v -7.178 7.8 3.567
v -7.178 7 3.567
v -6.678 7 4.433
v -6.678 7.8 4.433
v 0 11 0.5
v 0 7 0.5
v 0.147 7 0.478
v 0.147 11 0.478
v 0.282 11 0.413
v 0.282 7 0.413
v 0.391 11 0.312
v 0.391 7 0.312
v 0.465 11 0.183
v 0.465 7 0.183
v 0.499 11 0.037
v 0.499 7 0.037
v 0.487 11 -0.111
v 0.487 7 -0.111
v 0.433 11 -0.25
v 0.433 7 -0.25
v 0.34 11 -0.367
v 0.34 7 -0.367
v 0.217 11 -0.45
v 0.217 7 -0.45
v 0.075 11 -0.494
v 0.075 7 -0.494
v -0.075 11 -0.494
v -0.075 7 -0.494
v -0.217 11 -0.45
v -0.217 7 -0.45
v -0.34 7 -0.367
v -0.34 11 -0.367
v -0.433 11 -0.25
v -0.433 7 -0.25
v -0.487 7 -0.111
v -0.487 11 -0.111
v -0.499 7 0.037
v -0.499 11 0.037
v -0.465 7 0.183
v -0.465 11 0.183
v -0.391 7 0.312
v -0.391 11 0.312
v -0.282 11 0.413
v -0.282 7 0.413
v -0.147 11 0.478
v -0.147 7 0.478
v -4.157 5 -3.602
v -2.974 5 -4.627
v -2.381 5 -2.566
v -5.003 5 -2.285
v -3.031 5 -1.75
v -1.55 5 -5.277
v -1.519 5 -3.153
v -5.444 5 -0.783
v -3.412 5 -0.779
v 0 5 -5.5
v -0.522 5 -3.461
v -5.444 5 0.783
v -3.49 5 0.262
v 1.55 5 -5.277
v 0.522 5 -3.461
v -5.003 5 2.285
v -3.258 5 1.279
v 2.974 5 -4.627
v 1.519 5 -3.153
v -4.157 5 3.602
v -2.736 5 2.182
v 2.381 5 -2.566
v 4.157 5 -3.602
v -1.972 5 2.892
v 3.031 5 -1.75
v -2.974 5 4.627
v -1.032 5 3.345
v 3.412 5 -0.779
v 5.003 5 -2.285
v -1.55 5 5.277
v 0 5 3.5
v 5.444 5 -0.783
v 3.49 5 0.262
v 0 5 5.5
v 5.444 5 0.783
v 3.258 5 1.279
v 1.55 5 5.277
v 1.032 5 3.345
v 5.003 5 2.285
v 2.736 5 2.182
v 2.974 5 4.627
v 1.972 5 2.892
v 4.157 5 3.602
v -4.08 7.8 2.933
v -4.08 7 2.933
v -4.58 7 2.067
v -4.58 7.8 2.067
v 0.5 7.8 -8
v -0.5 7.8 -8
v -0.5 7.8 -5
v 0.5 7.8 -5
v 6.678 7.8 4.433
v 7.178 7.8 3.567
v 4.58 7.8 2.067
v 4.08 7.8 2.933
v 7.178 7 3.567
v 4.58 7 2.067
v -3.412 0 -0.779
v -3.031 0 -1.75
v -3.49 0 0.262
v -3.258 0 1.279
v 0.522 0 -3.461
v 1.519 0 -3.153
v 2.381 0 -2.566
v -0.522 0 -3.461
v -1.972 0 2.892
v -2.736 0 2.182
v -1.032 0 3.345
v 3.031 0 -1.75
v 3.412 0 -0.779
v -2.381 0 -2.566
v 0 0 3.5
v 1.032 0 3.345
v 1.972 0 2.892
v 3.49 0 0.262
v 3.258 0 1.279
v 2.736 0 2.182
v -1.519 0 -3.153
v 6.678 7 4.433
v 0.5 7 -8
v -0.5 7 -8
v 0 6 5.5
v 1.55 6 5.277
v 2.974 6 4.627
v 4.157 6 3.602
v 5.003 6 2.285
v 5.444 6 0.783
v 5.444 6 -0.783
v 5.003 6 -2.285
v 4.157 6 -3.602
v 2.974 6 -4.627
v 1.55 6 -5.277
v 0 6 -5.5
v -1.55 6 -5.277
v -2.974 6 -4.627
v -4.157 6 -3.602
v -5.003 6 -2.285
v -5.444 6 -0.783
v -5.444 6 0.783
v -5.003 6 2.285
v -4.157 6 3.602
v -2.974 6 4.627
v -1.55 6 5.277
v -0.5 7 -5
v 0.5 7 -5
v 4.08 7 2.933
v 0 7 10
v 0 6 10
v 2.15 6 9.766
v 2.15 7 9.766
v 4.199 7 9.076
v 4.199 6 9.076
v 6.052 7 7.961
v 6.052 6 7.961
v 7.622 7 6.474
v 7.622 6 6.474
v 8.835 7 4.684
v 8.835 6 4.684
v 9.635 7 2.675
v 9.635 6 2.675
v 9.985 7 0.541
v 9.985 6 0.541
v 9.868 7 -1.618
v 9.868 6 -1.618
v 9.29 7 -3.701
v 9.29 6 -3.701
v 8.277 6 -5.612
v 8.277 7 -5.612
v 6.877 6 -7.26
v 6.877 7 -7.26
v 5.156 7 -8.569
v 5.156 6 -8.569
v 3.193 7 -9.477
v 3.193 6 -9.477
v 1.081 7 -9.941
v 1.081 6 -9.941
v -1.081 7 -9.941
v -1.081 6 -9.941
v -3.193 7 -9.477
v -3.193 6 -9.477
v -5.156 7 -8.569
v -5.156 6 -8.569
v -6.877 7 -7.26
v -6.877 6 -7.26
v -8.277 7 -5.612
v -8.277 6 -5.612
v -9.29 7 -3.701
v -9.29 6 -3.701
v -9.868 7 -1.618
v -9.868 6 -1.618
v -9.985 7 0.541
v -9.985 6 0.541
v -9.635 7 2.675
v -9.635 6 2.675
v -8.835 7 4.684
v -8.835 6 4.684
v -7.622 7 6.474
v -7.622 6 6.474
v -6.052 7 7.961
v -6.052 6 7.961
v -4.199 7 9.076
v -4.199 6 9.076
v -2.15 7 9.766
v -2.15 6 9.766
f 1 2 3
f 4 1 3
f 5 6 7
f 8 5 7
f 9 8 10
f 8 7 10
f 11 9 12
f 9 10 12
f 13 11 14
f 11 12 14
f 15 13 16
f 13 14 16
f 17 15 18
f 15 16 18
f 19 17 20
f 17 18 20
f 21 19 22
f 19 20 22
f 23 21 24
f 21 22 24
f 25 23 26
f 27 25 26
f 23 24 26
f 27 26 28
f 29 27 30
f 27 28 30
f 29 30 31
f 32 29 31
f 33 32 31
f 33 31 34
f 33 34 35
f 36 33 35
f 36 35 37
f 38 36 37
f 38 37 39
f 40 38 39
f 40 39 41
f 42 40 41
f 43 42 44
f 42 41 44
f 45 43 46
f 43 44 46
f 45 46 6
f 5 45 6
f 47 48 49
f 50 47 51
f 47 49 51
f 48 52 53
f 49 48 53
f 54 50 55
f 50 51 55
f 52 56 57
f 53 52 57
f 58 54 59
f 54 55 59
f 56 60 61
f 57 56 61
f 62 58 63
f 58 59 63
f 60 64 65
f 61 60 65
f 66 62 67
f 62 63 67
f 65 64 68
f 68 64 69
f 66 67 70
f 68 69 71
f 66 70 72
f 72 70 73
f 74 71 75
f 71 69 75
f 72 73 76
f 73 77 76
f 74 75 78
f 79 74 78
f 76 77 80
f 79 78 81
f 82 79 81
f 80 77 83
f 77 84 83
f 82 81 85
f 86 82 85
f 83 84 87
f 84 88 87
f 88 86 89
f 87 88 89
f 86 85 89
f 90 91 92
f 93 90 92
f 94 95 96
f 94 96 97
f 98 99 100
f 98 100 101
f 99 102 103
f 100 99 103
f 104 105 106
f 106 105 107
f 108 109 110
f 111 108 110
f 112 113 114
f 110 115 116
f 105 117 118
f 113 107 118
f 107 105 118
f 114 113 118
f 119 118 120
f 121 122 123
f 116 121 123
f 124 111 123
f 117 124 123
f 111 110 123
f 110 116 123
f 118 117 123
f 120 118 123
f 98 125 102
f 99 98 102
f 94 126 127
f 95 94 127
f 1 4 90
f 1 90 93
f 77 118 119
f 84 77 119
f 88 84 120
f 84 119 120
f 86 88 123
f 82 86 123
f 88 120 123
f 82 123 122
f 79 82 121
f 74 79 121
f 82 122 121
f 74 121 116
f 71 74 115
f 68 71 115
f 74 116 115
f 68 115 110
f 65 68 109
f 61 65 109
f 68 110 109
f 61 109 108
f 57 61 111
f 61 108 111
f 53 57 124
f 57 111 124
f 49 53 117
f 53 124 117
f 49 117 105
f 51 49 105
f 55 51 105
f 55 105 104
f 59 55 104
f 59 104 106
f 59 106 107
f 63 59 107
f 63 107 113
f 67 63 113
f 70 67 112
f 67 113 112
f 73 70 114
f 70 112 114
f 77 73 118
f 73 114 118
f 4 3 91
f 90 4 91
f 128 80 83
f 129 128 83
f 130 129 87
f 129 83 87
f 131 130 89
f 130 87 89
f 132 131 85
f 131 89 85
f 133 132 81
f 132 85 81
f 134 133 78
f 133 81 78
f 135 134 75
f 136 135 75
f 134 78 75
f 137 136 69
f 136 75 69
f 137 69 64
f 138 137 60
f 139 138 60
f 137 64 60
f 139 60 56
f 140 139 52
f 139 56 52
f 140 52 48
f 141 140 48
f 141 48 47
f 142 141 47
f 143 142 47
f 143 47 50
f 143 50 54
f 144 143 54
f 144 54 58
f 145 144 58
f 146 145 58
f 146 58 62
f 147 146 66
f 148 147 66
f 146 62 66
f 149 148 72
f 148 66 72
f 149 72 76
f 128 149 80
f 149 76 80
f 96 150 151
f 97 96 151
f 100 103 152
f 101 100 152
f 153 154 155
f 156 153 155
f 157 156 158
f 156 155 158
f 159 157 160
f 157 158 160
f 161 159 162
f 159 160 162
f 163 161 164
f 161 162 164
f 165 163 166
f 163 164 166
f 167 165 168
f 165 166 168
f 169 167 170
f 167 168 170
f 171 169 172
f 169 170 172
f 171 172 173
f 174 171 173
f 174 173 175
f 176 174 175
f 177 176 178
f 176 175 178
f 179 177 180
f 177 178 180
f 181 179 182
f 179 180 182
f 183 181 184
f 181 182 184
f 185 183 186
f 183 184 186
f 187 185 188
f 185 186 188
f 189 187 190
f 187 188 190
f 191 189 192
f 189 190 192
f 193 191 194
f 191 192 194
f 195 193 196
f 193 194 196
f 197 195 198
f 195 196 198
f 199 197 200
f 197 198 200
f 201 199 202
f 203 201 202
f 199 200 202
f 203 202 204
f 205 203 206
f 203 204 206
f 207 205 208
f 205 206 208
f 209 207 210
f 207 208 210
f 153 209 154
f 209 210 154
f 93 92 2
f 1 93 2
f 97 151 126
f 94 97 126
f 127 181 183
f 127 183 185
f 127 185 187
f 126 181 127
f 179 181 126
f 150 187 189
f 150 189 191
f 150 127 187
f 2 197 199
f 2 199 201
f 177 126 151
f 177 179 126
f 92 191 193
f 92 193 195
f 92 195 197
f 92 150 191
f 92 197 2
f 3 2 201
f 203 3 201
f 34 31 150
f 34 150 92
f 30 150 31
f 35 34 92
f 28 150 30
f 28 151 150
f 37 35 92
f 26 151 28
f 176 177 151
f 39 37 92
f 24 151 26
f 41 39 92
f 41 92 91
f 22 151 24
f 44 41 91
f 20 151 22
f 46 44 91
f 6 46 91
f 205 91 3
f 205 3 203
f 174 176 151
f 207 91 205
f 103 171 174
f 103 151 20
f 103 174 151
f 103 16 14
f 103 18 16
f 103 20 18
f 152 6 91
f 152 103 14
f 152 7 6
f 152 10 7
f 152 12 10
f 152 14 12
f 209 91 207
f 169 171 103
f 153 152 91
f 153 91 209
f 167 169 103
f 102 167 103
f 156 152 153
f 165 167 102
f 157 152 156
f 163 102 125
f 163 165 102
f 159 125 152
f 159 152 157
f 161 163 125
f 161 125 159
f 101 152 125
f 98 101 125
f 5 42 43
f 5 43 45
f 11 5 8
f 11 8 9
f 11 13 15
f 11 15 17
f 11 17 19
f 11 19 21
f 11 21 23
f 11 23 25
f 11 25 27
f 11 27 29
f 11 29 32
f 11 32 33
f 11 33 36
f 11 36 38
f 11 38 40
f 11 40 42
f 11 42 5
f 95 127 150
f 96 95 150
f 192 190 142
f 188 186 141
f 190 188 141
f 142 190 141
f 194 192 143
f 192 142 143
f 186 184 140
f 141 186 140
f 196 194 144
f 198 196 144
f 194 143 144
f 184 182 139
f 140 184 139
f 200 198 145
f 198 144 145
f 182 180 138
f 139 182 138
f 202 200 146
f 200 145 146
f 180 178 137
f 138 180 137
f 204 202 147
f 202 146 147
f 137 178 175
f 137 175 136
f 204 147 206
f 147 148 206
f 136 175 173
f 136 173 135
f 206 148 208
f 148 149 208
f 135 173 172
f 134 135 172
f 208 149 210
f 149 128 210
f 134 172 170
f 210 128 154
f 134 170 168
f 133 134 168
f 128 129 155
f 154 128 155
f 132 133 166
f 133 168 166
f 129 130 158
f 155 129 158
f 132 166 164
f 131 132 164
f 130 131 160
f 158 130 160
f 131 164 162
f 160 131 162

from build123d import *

# Parameters (mm, degrees)
ESQUISSE1_R                  = 3.5
BOSS_EXTRU_1_DEPTH           = 5
ESQUISSE4_R                  = 5.5
BOSS_EXTRU_3_DEPTH           = 1
ESQUISSE5_R                  = 10
BOSS_EXTRU_4_DEPTH           = 1
ESQUISSE6_R                  = 0.5
BOSS_EXTRU_5_DEPTH           = 4
BOSS_EXTRU_6_DEPTH           = 0.8
R_P_TITION_CIRCULAIRE1_COUNT = 3


with BuildPart() as part:
    # Esquisse1 → Boss.-Extru.1 (new body)
    with BuildSketch(Plane(origin=(0, 0, 0), x_dir=(1, 0, 0), z_dir=(0, 1, 0))):
        with Locations(Location((0, 0, 0), (0, 0, 270))):
            Circle(ESQUISSE1_R)
    extrude(amount=BOSS_EXTRU_1_DEPTH)

    # Esquisse4 → Boss.-Extru.3 (add)
    with BuildSketch(Plane(origin=(0, 5, 0), x_dir=(1, 0, 0), z_dir=(0, 1, 0))):
        with Locations(Location((0, 0, 0), (0, 0, 270))):
            Circle(ESQUISSE4_R)
    extrude(amount=BOSS_EXTRU_3_DEPTH)

    # Esquisse5 → Boss.-Extru.4 (add)
    with BuildSketch(Plane(origin=(0, 6, 0), x_dir=(1, 0, 0), z_dir=(0, 1, 0))):
        with Locations(Location((0, 0, 0), (0, 0, 270))):
            Circle(ESQUISSE5_R)
    extrude(amount=BOSS_EXTRU_4_DEPTH)

    # Esquisse6 → Boss.-Extru.5 (add)
    with BuildSketch(Plane(origin=(0, 7, 0), x_dir=(1, 0, 0), z_dir=(0, 1, 0))):
        with Locations(Location((0, 0, 0), (0, 0, 270))):
            Circle(ESQUISSE6_R)
    extrude(amount=BOSS_EXTRU_5_DEPTH)

    # Esquisse7 → Boss.-Extru.6 (add)
    with BuildSketch(Plane(origin=(0, 7, 0), x_dir=(1, 0, 0), z_dir=(0, 1, 0))):
        Polygon((0, 5), (0.5, 5), (0.5, 8), (-0.5, 8), (-0.5, 5), align=None)
    boss_extru_6 = extrude(amount=BOSS_EXTRU_6_DEPTH)

    # Répétition circulaire1: Boss.-Extru.6 ×3 about axis
    r_p_tition_circulaire1_axis = Axis((0, 0, 0), (0, 1, 0))
    for i in range(1, R_P_TITION_CIRCULAIRE1_COUNT):
        add(boss_extru_6.rotate(r_p_tition_circulaire1_axis, i * 360 / R_P_TITION_CIRCULAIRE1_COUNT))


solid = part.part
